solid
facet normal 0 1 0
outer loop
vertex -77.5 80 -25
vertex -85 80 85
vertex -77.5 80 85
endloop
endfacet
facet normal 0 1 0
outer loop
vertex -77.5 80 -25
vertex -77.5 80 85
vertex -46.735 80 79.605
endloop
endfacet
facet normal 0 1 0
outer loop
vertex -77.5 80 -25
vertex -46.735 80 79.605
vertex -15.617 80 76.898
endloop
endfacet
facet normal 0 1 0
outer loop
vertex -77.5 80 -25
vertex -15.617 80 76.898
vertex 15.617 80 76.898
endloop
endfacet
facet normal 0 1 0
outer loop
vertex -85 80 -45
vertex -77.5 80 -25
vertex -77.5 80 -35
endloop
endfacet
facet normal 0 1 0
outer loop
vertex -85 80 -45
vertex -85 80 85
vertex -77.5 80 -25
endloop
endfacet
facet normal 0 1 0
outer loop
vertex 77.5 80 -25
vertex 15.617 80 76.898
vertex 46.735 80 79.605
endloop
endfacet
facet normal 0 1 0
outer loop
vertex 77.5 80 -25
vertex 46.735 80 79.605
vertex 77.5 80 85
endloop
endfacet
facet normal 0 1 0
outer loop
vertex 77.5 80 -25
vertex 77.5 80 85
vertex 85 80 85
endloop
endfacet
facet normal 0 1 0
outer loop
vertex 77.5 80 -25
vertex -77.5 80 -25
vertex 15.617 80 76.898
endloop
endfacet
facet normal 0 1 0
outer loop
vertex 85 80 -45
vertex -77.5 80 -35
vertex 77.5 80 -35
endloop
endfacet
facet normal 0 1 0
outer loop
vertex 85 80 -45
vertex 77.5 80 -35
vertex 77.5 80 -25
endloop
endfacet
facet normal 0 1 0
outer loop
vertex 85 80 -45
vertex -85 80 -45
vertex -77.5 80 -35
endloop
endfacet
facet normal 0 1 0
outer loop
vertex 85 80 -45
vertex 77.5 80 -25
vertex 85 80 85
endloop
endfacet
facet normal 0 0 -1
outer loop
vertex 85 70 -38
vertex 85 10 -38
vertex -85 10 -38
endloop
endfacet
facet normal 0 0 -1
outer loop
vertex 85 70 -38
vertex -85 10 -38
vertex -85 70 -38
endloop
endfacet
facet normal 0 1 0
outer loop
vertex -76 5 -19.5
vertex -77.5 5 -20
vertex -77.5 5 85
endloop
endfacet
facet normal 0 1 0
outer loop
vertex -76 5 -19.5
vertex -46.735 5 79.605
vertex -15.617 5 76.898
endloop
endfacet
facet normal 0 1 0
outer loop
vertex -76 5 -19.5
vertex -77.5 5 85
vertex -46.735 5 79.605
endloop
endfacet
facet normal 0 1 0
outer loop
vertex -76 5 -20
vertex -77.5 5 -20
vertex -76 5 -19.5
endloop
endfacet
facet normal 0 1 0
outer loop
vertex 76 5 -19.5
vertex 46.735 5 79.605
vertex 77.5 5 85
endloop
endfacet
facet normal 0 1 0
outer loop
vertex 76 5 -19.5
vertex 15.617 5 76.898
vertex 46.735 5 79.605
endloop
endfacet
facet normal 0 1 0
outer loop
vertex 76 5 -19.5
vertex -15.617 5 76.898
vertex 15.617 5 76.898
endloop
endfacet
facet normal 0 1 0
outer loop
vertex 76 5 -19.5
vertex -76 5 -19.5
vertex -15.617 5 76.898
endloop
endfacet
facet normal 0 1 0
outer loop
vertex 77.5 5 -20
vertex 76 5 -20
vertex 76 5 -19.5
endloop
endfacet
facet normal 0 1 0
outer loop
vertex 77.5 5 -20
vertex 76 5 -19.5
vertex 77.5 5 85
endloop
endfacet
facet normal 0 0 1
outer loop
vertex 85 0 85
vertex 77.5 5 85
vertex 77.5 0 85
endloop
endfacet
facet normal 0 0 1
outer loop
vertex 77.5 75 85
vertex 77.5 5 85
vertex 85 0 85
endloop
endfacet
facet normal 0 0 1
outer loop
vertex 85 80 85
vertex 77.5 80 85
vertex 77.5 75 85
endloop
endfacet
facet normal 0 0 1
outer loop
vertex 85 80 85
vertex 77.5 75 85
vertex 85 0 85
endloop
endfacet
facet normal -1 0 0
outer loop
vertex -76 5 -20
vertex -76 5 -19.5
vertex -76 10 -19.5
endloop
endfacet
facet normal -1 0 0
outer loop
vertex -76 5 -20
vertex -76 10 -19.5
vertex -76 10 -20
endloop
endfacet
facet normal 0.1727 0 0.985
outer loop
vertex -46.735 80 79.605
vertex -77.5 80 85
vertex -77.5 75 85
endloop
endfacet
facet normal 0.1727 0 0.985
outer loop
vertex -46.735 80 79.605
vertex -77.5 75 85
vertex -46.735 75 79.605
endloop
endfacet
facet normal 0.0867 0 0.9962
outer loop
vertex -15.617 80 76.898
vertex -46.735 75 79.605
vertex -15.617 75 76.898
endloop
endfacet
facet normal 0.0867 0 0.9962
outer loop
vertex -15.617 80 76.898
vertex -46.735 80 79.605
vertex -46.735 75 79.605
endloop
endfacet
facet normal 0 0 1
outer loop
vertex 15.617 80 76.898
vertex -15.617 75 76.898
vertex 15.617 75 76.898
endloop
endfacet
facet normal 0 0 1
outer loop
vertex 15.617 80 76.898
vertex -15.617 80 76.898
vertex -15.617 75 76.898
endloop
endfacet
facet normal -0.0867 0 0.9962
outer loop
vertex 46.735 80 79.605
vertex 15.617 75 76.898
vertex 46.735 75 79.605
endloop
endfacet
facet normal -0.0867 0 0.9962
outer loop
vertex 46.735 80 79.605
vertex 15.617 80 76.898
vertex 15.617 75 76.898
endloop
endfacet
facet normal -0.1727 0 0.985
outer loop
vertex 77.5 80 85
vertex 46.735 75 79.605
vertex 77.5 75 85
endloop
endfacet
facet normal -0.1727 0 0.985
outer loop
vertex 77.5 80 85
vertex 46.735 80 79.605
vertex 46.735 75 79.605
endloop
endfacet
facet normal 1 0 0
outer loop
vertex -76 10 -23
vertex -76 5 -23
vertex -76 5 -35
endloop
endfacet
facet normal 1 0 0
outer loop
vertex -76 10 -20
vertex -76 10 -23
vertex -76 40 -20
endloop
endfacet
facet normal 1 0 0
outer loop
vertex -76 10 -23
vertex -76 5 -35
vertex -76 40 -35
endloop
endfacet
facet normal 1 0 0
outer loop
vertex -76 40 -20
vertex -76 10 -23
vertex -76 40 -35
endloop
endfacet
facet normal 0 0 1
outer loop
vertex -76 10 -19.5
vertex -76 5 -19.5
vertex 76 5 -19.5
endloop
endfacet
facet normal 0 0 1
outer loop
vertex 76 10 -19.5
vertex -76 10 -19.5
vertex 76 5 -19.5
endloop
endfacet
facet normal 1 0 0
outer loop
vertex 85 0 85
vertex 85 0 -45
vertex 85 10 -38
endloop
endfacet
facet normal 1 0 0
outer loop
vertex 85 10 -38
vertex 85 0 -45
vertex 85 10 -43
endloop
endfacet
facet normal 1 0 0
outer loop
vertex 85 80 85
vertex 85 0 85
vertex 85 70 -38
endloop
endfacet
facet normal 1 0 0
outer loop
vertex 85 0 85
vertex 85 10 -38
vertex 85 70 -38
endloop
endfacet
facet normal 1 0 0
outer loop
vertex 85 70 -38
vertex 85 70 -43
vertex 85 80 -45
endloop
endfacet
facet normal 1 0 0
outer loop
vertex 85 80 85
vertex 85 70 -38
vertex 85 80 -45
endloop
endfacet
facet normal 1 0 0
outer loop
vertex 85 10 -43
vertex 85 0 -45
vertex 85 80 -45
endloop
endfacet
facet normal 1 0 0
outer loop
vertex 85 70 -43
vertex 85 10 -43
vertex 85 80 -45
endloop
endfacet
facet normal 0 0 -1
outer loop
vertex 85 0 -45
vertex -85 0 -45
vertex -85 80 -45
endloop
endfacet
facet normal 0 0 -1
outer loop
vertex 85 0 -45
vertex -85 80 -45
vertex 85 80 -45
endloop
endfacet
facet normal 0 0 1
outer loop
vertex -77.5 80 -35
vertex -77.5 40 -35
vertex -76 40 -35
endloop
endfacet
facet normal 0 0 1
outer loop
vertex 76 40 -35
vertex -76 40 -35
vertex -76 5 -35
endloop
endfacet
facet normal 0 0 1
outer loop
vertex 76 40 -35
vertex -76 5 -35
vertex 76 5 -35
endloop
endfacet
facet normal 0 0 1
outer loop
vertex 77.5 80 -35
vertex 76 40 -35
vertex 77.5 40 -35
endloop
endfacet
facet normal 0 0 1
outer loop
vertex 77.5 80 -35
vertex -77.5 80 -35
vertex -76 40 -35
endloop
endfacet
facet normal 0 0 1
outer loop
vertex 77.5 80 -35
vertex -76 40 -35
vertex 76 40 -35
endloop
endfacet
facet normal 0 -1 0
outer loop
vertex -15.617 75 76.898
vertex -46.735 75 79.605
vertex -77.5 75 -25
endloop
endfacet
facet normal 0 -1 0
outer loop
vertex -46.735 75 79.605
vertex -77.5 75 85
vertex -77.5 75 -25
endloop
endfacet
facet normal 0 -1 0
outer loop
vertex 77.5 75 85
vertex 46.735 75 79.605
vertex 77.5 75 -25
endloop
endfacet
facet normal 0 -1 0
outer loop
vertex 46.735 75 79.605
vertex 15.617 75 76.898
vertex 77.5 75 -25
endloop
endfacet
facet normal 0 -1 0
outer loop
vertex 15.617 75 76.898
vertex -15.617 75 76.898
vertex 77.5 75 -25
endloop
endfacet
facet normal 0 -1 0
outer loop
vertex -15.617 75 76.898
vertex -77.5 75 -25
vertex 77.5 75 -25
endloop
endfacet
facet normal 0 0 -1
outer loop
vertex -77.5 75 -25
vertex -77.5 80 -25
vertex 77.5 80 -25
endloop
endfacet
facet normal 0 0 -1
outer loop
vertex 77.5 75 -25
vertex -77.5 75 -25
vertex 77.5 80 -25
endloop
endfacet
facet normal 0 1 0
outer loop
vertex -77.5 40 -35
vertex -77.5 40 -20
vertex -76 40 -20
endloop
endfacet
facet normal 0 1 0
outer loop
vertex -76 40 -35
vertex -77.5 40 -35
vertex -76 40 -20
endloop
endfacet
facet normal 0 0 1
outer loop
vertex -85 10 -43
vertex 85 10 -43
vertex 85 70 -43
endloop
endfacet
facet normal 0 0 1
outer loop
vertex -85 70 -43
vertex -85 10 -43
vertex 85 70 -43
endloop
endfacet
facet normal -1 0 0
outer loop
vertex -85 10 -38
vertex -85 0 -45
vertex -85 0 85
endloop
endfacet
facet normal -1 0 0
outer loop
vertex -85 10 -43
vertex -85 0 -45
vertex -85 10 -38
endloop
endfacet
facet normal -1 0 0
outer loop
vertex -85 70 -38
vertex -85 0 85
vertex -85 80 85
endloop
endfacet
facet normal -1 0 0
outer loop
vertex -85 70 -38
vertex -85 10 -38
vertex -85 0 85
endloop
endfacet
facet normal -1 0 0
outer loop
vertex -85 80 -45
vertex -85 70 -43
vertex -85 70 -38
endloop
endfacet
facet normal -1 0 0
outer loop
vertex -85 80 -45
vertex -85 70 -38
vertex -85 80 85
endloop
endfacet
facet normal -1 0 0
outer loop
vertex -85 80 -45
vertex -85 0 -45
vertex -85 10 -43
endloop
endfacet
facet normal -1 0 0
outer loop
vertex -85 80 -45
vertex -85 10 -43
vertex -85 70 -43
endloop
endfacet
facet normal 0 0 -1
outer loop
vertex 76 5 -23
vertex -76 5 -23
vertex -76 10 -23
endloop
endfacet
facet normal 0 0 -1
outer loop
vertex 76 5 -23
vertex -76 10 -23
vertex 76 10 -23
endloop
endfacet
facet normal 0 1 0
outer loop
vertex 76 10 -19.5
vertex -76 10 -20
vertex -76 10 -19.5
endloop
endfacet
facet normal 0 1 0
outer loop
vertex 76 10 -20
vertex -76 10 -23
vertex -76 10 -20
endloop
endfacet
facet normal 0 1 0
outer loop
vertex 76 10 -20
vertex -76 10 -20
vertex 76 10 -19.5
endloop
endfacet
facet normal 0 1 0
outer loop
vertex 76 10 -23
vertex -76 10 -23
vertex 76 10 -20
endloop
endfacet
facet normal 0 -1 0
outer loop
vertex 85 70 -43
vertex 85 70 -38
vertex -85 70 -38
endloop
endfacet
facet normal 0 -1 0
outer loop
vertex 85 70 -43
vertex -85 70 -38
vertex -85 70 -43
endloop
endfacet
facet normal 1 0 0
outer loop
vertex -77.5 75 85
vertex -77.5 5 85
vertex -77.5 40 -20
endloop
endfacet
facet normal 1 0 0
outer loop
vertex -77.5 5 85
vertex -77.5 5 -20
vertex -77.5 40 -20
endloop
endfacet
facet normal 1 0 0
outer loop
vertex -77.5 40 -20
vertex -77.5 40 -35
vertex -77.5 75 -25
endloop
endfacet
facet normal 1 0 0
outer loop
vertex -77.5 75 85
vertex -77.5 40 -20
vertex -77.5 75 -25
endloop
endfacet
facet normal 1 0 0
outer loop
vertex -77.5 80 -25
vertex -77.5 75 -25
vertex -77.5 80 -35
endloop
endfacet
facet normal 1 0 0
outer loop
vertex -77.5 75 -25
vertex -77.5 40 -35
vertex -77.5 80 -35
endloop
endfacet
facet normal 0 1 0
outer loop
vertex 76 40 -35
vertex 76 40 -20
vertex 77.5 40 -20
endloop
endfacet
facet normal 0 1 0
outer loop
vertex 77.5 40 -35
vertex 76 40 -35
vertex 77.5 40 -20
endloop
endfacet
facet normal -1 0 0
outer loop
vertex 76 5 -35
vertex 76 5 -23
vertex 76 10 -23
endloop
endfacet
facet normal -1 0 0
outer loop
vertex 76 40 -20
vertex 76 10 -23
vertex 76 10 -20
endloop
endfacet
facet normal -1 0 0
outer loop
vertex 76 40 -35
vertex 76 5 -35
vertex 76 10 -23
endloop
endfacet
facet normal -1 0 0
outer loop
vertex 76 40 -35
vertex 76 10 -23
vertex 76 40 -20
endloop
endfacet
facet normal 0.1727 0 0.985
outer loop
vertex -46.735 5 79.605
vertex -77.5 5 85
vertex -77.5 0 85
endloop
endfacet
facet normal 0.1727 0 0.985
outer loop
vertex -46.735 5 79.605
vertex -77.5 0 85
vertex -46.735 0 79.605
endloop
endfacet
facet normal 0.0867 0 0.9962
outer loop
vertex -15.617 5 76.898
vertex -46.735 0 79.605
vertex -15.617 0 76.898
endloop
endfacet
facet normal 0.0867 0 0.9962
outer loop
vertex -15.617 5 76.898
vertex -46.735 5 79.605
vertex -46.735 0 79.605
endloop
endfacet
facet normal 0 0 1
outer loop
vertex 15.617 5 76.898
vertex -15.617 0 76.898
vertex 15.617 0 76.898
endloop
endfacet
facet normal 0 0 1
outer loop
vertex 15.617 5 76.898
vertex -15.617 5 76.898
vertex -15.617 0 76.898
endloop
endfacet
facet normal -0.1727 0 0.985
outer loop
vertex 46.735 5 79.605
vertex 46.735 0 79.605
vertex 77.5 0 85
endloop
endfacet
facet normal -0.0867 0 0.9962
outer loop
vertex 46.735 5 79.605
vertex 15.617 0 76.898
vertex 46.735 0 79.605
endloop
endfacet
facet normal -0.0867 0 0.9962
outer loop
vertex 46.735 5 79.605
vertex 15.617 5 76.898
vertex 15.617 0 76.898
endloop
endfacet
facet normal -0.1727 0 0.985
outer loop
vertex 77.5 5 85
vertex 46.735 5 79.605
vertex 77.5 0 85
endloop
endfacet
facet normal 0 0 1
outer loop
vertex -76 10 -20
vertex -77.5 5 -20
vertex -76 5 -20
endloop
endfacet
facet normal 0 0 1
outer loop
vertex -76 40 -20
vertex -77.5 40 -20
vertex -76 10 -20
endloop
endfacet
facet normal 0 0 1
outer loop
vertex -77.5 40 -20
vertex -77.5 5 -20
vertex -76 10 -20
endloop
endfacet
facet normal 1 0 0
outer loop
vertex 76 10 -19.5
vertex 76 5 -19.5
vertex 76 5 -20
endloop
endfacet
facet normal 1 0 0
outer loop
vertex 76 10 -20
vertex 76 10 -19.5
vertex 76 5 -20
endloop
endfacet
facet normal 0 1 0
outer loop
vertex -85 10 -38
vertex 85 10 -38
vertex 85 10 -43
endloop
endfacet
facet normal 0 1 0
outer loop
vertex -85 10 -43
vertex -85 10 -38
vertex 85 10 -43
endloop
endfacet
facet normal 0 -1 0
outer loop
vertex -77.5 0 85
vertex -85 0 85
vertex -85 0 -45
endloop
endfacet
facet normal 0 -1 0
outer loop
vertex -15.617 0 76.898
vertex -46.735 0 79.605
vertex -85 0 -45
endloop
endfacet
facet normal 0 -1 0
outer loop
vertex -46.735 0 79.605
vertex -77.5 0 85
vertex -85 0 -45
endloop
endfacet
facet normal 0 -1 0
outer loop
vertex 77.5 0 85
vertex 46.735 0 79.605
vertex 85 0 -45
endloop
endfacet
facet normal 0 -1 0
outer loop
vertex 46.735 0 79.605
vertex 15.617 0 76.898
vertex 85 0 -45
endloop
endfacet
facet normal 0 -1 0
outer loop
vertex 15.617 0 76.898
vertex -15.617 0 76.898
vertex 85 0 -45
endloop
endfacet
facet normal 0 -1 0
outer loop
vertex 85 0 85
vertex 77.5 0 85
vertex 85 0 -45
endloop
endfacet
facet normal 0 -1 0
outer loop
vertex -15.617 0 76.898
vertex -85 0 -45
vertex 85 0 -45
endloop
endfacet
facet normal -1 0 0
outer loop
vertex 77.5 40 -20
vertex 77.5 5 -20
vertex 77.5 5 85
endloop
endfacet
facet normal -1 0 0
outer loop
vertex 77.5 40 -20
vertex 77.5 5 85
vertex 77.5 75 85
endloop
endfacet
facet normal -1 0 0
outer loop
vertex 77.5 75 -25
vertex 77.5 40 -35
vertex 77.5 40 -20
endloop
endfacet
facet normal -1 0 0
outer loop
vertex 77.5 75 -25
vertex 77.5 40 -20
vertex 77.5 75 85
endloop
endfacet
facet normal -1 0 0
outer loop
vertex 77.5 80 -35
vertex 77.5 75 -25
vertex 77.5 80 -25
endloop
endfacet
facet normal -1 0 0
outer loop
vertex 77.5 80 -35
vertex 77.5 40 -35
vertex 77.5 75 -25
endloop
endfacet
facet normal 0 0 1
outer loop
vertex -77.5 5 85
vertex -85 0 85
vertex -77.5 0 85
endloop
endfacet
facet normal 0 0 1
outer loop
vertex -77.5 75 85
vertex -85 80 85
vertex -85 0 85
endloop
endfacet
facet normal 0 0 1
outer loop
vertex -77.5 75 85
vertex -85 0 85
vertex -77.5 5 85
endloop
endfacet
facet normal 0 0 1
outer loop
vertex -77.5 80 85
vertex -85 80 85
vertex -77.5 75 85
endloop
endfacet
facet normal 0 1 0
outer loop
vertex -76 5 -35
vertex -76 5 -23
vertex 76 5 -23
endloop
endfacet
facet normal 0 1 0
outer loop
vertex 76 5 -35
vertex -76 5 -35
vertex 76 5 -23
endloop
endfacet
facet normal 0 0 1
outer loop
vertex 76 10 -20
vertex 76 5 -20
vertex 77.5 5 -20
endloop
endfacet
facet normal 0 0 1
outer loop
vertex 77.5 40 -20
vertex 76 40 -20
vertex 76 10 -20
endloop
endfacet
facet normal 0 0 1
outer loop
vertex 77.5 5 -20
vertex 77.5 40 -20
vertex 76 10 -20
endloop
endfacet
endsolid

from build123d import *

# Parameters (mm, degrees)
SKETCH1_W            = 170
SKETCH1_H            = 90
BOSS_EXTRUDE1_DEPTH  = 80
SKETCH3_W            = 170
SKETCH3_H            = 80
BOSS_EXTRUDE3_DEPTH  = 30
SKETCH5_W            = 155
SKETCH5_H            = 70
CUT_EXTRUDE3_DEPTH   = 110
SKETCH4_W            = 155
SKETCH4_H            = 10
CUT_EXTRUDE4_DEPTH   = 75
SKETCH6_W            = 1.5
SKETCH6_H            = 35
BOSS_EXTRUDE9_DEPTH  = 15
SKETCH7_W            = 152
SKETCH7_H            = 3.5
BOSS_EXTRUDE10_DEPTH = 5
SKETCH10_W           = 170
SKETCH10_H           = 80
SKETCH10_W_2         = 155
SKETCH10_H_2         = 70
BOSS_EXTRUDE13_DEPTH = 10
CUT_EXTRUDE5_DEPTH   = 81
SKETCH14_W           = 5
SKETCH14_H           = 60
CUT_EXTRUDE6_DEPTH   = 171


with BuildPart() as part:
    # Sketch1 → Boss-Extrude1 (new body)
    with BuildSketch(Plane(origin=(0, 0, 0), x_dir=(1, 0, 0), z_dir=(0, 1, 0))):
        Rectangle(SKETCH1_W, SKETCH1_H)
    extrude(amount=BOSS_EXTRUDE1_DEPTH)

    # Sketch3 → Boss-Extrude3 (add)
    with BuildSketch(Plane.XY.offset(45)):
        with Locations((0, 40)):
            Rectangle(SKETCH3_W, SKETCH3_H)
    extrude(amount=BOSS_EXTRUDE3_DEPTH)

    # Sketch5 → Cut-Extrude3 (cut)
    with BuildSketch(Plane.XY.offset(75)):
        with Locations((0, 40)):
            Rectangle(SKETCH5_W, SKETCH5_H)
    extrude(amount=-CUT_EXTRUDE3_DEPTH, mode=Mode.SUBTRACT)

    # Sketch4 → Cut-Extrude4 (cut)
    with BuildSketch(Plane(origin=(0, 80, 0), x_dir=(1, 0, 0), z_dir=(0, 1, 0))):
        with Locations((0, 30)):
            Rectangle(SKETCH4_W, SKETCH4_H)
    extrude(amount=-CUT_EXTRUDE4_DEPTH, mode=Mode.SUBTRACT)

    # Sketch6 → Boss-Extrude9 (add)
    with BuildSketch(Plane.XY.offset(-35)):
        with Locations((76.75, 22.5)):
            Rectangle(SKETCH6_W, SKETCH6_H)
        with Locations((-76.75, 22.5)):
            Rectangle(SKETCH6_W, SKETCH6_H)
    extrude(amount=BOSS_EXTRUDE9_DEPTH)

    # Sketch7 → Boss-Extrude10 (add)
    with BuildSketch(Plane(origin=(0, 5, 0), x_dir=(1, 0, 0), z_dir=(0, 1, 0))):
        with Locations((0, 21.25)):
            Rectangle(SKETCH7_W, SKETCH7_H)
    extrude(amount=BOSS_EXTRUDE10_DEPTH)

    # Sketch10 → Boss-Extrude13 (add)
    with BuildSketch(Plane.XY.offset(75)):
        with Locations((0, 40)):
            Rectangle(SKETCH10_W, SKETCH10_H)
        with Locations((0, 40)):
            Rectangle(SKETCH10_W_2, SKETCH10_H_2, mode=Mode.SUBTRACT)
    extrude(amount=BOSS_EXTRUDE13_DEPTH)

    # Sketch11 → Cut-Extrude5 (cut, through all)
    with BuildSketch(Plane(origin=(0, 80, 0), x_dir=(1, 0, 0), z_dir=(0, 1, 0))):
        with BuildLine():
            Line((77.5, -85), (-77.5, -85))
            ThreePointArc((-77.5, -85), (0, -76.559027761), (77.5, -85))
        make_face()
    extrude(amount=-CUT_EXTRUDE5_DEPTH, mode=Mode.SUBTRACT)

    # Sketch14 → Cut-Extrude6 (cut, through all)
    with BuildSketch(Plane(origin=(85, 0, 0), x_dir=(0, 0, -1), z_dir=(1, 0, 0))):
        with Locations((40.5, 40)):
            Rectangle(SKETCH14_W, SKETCH14_H)
    extrude(amount=-CUT_EXTRUDE6_DEPTH, mode=Mode.SUBTRACT)


solid = part.part
